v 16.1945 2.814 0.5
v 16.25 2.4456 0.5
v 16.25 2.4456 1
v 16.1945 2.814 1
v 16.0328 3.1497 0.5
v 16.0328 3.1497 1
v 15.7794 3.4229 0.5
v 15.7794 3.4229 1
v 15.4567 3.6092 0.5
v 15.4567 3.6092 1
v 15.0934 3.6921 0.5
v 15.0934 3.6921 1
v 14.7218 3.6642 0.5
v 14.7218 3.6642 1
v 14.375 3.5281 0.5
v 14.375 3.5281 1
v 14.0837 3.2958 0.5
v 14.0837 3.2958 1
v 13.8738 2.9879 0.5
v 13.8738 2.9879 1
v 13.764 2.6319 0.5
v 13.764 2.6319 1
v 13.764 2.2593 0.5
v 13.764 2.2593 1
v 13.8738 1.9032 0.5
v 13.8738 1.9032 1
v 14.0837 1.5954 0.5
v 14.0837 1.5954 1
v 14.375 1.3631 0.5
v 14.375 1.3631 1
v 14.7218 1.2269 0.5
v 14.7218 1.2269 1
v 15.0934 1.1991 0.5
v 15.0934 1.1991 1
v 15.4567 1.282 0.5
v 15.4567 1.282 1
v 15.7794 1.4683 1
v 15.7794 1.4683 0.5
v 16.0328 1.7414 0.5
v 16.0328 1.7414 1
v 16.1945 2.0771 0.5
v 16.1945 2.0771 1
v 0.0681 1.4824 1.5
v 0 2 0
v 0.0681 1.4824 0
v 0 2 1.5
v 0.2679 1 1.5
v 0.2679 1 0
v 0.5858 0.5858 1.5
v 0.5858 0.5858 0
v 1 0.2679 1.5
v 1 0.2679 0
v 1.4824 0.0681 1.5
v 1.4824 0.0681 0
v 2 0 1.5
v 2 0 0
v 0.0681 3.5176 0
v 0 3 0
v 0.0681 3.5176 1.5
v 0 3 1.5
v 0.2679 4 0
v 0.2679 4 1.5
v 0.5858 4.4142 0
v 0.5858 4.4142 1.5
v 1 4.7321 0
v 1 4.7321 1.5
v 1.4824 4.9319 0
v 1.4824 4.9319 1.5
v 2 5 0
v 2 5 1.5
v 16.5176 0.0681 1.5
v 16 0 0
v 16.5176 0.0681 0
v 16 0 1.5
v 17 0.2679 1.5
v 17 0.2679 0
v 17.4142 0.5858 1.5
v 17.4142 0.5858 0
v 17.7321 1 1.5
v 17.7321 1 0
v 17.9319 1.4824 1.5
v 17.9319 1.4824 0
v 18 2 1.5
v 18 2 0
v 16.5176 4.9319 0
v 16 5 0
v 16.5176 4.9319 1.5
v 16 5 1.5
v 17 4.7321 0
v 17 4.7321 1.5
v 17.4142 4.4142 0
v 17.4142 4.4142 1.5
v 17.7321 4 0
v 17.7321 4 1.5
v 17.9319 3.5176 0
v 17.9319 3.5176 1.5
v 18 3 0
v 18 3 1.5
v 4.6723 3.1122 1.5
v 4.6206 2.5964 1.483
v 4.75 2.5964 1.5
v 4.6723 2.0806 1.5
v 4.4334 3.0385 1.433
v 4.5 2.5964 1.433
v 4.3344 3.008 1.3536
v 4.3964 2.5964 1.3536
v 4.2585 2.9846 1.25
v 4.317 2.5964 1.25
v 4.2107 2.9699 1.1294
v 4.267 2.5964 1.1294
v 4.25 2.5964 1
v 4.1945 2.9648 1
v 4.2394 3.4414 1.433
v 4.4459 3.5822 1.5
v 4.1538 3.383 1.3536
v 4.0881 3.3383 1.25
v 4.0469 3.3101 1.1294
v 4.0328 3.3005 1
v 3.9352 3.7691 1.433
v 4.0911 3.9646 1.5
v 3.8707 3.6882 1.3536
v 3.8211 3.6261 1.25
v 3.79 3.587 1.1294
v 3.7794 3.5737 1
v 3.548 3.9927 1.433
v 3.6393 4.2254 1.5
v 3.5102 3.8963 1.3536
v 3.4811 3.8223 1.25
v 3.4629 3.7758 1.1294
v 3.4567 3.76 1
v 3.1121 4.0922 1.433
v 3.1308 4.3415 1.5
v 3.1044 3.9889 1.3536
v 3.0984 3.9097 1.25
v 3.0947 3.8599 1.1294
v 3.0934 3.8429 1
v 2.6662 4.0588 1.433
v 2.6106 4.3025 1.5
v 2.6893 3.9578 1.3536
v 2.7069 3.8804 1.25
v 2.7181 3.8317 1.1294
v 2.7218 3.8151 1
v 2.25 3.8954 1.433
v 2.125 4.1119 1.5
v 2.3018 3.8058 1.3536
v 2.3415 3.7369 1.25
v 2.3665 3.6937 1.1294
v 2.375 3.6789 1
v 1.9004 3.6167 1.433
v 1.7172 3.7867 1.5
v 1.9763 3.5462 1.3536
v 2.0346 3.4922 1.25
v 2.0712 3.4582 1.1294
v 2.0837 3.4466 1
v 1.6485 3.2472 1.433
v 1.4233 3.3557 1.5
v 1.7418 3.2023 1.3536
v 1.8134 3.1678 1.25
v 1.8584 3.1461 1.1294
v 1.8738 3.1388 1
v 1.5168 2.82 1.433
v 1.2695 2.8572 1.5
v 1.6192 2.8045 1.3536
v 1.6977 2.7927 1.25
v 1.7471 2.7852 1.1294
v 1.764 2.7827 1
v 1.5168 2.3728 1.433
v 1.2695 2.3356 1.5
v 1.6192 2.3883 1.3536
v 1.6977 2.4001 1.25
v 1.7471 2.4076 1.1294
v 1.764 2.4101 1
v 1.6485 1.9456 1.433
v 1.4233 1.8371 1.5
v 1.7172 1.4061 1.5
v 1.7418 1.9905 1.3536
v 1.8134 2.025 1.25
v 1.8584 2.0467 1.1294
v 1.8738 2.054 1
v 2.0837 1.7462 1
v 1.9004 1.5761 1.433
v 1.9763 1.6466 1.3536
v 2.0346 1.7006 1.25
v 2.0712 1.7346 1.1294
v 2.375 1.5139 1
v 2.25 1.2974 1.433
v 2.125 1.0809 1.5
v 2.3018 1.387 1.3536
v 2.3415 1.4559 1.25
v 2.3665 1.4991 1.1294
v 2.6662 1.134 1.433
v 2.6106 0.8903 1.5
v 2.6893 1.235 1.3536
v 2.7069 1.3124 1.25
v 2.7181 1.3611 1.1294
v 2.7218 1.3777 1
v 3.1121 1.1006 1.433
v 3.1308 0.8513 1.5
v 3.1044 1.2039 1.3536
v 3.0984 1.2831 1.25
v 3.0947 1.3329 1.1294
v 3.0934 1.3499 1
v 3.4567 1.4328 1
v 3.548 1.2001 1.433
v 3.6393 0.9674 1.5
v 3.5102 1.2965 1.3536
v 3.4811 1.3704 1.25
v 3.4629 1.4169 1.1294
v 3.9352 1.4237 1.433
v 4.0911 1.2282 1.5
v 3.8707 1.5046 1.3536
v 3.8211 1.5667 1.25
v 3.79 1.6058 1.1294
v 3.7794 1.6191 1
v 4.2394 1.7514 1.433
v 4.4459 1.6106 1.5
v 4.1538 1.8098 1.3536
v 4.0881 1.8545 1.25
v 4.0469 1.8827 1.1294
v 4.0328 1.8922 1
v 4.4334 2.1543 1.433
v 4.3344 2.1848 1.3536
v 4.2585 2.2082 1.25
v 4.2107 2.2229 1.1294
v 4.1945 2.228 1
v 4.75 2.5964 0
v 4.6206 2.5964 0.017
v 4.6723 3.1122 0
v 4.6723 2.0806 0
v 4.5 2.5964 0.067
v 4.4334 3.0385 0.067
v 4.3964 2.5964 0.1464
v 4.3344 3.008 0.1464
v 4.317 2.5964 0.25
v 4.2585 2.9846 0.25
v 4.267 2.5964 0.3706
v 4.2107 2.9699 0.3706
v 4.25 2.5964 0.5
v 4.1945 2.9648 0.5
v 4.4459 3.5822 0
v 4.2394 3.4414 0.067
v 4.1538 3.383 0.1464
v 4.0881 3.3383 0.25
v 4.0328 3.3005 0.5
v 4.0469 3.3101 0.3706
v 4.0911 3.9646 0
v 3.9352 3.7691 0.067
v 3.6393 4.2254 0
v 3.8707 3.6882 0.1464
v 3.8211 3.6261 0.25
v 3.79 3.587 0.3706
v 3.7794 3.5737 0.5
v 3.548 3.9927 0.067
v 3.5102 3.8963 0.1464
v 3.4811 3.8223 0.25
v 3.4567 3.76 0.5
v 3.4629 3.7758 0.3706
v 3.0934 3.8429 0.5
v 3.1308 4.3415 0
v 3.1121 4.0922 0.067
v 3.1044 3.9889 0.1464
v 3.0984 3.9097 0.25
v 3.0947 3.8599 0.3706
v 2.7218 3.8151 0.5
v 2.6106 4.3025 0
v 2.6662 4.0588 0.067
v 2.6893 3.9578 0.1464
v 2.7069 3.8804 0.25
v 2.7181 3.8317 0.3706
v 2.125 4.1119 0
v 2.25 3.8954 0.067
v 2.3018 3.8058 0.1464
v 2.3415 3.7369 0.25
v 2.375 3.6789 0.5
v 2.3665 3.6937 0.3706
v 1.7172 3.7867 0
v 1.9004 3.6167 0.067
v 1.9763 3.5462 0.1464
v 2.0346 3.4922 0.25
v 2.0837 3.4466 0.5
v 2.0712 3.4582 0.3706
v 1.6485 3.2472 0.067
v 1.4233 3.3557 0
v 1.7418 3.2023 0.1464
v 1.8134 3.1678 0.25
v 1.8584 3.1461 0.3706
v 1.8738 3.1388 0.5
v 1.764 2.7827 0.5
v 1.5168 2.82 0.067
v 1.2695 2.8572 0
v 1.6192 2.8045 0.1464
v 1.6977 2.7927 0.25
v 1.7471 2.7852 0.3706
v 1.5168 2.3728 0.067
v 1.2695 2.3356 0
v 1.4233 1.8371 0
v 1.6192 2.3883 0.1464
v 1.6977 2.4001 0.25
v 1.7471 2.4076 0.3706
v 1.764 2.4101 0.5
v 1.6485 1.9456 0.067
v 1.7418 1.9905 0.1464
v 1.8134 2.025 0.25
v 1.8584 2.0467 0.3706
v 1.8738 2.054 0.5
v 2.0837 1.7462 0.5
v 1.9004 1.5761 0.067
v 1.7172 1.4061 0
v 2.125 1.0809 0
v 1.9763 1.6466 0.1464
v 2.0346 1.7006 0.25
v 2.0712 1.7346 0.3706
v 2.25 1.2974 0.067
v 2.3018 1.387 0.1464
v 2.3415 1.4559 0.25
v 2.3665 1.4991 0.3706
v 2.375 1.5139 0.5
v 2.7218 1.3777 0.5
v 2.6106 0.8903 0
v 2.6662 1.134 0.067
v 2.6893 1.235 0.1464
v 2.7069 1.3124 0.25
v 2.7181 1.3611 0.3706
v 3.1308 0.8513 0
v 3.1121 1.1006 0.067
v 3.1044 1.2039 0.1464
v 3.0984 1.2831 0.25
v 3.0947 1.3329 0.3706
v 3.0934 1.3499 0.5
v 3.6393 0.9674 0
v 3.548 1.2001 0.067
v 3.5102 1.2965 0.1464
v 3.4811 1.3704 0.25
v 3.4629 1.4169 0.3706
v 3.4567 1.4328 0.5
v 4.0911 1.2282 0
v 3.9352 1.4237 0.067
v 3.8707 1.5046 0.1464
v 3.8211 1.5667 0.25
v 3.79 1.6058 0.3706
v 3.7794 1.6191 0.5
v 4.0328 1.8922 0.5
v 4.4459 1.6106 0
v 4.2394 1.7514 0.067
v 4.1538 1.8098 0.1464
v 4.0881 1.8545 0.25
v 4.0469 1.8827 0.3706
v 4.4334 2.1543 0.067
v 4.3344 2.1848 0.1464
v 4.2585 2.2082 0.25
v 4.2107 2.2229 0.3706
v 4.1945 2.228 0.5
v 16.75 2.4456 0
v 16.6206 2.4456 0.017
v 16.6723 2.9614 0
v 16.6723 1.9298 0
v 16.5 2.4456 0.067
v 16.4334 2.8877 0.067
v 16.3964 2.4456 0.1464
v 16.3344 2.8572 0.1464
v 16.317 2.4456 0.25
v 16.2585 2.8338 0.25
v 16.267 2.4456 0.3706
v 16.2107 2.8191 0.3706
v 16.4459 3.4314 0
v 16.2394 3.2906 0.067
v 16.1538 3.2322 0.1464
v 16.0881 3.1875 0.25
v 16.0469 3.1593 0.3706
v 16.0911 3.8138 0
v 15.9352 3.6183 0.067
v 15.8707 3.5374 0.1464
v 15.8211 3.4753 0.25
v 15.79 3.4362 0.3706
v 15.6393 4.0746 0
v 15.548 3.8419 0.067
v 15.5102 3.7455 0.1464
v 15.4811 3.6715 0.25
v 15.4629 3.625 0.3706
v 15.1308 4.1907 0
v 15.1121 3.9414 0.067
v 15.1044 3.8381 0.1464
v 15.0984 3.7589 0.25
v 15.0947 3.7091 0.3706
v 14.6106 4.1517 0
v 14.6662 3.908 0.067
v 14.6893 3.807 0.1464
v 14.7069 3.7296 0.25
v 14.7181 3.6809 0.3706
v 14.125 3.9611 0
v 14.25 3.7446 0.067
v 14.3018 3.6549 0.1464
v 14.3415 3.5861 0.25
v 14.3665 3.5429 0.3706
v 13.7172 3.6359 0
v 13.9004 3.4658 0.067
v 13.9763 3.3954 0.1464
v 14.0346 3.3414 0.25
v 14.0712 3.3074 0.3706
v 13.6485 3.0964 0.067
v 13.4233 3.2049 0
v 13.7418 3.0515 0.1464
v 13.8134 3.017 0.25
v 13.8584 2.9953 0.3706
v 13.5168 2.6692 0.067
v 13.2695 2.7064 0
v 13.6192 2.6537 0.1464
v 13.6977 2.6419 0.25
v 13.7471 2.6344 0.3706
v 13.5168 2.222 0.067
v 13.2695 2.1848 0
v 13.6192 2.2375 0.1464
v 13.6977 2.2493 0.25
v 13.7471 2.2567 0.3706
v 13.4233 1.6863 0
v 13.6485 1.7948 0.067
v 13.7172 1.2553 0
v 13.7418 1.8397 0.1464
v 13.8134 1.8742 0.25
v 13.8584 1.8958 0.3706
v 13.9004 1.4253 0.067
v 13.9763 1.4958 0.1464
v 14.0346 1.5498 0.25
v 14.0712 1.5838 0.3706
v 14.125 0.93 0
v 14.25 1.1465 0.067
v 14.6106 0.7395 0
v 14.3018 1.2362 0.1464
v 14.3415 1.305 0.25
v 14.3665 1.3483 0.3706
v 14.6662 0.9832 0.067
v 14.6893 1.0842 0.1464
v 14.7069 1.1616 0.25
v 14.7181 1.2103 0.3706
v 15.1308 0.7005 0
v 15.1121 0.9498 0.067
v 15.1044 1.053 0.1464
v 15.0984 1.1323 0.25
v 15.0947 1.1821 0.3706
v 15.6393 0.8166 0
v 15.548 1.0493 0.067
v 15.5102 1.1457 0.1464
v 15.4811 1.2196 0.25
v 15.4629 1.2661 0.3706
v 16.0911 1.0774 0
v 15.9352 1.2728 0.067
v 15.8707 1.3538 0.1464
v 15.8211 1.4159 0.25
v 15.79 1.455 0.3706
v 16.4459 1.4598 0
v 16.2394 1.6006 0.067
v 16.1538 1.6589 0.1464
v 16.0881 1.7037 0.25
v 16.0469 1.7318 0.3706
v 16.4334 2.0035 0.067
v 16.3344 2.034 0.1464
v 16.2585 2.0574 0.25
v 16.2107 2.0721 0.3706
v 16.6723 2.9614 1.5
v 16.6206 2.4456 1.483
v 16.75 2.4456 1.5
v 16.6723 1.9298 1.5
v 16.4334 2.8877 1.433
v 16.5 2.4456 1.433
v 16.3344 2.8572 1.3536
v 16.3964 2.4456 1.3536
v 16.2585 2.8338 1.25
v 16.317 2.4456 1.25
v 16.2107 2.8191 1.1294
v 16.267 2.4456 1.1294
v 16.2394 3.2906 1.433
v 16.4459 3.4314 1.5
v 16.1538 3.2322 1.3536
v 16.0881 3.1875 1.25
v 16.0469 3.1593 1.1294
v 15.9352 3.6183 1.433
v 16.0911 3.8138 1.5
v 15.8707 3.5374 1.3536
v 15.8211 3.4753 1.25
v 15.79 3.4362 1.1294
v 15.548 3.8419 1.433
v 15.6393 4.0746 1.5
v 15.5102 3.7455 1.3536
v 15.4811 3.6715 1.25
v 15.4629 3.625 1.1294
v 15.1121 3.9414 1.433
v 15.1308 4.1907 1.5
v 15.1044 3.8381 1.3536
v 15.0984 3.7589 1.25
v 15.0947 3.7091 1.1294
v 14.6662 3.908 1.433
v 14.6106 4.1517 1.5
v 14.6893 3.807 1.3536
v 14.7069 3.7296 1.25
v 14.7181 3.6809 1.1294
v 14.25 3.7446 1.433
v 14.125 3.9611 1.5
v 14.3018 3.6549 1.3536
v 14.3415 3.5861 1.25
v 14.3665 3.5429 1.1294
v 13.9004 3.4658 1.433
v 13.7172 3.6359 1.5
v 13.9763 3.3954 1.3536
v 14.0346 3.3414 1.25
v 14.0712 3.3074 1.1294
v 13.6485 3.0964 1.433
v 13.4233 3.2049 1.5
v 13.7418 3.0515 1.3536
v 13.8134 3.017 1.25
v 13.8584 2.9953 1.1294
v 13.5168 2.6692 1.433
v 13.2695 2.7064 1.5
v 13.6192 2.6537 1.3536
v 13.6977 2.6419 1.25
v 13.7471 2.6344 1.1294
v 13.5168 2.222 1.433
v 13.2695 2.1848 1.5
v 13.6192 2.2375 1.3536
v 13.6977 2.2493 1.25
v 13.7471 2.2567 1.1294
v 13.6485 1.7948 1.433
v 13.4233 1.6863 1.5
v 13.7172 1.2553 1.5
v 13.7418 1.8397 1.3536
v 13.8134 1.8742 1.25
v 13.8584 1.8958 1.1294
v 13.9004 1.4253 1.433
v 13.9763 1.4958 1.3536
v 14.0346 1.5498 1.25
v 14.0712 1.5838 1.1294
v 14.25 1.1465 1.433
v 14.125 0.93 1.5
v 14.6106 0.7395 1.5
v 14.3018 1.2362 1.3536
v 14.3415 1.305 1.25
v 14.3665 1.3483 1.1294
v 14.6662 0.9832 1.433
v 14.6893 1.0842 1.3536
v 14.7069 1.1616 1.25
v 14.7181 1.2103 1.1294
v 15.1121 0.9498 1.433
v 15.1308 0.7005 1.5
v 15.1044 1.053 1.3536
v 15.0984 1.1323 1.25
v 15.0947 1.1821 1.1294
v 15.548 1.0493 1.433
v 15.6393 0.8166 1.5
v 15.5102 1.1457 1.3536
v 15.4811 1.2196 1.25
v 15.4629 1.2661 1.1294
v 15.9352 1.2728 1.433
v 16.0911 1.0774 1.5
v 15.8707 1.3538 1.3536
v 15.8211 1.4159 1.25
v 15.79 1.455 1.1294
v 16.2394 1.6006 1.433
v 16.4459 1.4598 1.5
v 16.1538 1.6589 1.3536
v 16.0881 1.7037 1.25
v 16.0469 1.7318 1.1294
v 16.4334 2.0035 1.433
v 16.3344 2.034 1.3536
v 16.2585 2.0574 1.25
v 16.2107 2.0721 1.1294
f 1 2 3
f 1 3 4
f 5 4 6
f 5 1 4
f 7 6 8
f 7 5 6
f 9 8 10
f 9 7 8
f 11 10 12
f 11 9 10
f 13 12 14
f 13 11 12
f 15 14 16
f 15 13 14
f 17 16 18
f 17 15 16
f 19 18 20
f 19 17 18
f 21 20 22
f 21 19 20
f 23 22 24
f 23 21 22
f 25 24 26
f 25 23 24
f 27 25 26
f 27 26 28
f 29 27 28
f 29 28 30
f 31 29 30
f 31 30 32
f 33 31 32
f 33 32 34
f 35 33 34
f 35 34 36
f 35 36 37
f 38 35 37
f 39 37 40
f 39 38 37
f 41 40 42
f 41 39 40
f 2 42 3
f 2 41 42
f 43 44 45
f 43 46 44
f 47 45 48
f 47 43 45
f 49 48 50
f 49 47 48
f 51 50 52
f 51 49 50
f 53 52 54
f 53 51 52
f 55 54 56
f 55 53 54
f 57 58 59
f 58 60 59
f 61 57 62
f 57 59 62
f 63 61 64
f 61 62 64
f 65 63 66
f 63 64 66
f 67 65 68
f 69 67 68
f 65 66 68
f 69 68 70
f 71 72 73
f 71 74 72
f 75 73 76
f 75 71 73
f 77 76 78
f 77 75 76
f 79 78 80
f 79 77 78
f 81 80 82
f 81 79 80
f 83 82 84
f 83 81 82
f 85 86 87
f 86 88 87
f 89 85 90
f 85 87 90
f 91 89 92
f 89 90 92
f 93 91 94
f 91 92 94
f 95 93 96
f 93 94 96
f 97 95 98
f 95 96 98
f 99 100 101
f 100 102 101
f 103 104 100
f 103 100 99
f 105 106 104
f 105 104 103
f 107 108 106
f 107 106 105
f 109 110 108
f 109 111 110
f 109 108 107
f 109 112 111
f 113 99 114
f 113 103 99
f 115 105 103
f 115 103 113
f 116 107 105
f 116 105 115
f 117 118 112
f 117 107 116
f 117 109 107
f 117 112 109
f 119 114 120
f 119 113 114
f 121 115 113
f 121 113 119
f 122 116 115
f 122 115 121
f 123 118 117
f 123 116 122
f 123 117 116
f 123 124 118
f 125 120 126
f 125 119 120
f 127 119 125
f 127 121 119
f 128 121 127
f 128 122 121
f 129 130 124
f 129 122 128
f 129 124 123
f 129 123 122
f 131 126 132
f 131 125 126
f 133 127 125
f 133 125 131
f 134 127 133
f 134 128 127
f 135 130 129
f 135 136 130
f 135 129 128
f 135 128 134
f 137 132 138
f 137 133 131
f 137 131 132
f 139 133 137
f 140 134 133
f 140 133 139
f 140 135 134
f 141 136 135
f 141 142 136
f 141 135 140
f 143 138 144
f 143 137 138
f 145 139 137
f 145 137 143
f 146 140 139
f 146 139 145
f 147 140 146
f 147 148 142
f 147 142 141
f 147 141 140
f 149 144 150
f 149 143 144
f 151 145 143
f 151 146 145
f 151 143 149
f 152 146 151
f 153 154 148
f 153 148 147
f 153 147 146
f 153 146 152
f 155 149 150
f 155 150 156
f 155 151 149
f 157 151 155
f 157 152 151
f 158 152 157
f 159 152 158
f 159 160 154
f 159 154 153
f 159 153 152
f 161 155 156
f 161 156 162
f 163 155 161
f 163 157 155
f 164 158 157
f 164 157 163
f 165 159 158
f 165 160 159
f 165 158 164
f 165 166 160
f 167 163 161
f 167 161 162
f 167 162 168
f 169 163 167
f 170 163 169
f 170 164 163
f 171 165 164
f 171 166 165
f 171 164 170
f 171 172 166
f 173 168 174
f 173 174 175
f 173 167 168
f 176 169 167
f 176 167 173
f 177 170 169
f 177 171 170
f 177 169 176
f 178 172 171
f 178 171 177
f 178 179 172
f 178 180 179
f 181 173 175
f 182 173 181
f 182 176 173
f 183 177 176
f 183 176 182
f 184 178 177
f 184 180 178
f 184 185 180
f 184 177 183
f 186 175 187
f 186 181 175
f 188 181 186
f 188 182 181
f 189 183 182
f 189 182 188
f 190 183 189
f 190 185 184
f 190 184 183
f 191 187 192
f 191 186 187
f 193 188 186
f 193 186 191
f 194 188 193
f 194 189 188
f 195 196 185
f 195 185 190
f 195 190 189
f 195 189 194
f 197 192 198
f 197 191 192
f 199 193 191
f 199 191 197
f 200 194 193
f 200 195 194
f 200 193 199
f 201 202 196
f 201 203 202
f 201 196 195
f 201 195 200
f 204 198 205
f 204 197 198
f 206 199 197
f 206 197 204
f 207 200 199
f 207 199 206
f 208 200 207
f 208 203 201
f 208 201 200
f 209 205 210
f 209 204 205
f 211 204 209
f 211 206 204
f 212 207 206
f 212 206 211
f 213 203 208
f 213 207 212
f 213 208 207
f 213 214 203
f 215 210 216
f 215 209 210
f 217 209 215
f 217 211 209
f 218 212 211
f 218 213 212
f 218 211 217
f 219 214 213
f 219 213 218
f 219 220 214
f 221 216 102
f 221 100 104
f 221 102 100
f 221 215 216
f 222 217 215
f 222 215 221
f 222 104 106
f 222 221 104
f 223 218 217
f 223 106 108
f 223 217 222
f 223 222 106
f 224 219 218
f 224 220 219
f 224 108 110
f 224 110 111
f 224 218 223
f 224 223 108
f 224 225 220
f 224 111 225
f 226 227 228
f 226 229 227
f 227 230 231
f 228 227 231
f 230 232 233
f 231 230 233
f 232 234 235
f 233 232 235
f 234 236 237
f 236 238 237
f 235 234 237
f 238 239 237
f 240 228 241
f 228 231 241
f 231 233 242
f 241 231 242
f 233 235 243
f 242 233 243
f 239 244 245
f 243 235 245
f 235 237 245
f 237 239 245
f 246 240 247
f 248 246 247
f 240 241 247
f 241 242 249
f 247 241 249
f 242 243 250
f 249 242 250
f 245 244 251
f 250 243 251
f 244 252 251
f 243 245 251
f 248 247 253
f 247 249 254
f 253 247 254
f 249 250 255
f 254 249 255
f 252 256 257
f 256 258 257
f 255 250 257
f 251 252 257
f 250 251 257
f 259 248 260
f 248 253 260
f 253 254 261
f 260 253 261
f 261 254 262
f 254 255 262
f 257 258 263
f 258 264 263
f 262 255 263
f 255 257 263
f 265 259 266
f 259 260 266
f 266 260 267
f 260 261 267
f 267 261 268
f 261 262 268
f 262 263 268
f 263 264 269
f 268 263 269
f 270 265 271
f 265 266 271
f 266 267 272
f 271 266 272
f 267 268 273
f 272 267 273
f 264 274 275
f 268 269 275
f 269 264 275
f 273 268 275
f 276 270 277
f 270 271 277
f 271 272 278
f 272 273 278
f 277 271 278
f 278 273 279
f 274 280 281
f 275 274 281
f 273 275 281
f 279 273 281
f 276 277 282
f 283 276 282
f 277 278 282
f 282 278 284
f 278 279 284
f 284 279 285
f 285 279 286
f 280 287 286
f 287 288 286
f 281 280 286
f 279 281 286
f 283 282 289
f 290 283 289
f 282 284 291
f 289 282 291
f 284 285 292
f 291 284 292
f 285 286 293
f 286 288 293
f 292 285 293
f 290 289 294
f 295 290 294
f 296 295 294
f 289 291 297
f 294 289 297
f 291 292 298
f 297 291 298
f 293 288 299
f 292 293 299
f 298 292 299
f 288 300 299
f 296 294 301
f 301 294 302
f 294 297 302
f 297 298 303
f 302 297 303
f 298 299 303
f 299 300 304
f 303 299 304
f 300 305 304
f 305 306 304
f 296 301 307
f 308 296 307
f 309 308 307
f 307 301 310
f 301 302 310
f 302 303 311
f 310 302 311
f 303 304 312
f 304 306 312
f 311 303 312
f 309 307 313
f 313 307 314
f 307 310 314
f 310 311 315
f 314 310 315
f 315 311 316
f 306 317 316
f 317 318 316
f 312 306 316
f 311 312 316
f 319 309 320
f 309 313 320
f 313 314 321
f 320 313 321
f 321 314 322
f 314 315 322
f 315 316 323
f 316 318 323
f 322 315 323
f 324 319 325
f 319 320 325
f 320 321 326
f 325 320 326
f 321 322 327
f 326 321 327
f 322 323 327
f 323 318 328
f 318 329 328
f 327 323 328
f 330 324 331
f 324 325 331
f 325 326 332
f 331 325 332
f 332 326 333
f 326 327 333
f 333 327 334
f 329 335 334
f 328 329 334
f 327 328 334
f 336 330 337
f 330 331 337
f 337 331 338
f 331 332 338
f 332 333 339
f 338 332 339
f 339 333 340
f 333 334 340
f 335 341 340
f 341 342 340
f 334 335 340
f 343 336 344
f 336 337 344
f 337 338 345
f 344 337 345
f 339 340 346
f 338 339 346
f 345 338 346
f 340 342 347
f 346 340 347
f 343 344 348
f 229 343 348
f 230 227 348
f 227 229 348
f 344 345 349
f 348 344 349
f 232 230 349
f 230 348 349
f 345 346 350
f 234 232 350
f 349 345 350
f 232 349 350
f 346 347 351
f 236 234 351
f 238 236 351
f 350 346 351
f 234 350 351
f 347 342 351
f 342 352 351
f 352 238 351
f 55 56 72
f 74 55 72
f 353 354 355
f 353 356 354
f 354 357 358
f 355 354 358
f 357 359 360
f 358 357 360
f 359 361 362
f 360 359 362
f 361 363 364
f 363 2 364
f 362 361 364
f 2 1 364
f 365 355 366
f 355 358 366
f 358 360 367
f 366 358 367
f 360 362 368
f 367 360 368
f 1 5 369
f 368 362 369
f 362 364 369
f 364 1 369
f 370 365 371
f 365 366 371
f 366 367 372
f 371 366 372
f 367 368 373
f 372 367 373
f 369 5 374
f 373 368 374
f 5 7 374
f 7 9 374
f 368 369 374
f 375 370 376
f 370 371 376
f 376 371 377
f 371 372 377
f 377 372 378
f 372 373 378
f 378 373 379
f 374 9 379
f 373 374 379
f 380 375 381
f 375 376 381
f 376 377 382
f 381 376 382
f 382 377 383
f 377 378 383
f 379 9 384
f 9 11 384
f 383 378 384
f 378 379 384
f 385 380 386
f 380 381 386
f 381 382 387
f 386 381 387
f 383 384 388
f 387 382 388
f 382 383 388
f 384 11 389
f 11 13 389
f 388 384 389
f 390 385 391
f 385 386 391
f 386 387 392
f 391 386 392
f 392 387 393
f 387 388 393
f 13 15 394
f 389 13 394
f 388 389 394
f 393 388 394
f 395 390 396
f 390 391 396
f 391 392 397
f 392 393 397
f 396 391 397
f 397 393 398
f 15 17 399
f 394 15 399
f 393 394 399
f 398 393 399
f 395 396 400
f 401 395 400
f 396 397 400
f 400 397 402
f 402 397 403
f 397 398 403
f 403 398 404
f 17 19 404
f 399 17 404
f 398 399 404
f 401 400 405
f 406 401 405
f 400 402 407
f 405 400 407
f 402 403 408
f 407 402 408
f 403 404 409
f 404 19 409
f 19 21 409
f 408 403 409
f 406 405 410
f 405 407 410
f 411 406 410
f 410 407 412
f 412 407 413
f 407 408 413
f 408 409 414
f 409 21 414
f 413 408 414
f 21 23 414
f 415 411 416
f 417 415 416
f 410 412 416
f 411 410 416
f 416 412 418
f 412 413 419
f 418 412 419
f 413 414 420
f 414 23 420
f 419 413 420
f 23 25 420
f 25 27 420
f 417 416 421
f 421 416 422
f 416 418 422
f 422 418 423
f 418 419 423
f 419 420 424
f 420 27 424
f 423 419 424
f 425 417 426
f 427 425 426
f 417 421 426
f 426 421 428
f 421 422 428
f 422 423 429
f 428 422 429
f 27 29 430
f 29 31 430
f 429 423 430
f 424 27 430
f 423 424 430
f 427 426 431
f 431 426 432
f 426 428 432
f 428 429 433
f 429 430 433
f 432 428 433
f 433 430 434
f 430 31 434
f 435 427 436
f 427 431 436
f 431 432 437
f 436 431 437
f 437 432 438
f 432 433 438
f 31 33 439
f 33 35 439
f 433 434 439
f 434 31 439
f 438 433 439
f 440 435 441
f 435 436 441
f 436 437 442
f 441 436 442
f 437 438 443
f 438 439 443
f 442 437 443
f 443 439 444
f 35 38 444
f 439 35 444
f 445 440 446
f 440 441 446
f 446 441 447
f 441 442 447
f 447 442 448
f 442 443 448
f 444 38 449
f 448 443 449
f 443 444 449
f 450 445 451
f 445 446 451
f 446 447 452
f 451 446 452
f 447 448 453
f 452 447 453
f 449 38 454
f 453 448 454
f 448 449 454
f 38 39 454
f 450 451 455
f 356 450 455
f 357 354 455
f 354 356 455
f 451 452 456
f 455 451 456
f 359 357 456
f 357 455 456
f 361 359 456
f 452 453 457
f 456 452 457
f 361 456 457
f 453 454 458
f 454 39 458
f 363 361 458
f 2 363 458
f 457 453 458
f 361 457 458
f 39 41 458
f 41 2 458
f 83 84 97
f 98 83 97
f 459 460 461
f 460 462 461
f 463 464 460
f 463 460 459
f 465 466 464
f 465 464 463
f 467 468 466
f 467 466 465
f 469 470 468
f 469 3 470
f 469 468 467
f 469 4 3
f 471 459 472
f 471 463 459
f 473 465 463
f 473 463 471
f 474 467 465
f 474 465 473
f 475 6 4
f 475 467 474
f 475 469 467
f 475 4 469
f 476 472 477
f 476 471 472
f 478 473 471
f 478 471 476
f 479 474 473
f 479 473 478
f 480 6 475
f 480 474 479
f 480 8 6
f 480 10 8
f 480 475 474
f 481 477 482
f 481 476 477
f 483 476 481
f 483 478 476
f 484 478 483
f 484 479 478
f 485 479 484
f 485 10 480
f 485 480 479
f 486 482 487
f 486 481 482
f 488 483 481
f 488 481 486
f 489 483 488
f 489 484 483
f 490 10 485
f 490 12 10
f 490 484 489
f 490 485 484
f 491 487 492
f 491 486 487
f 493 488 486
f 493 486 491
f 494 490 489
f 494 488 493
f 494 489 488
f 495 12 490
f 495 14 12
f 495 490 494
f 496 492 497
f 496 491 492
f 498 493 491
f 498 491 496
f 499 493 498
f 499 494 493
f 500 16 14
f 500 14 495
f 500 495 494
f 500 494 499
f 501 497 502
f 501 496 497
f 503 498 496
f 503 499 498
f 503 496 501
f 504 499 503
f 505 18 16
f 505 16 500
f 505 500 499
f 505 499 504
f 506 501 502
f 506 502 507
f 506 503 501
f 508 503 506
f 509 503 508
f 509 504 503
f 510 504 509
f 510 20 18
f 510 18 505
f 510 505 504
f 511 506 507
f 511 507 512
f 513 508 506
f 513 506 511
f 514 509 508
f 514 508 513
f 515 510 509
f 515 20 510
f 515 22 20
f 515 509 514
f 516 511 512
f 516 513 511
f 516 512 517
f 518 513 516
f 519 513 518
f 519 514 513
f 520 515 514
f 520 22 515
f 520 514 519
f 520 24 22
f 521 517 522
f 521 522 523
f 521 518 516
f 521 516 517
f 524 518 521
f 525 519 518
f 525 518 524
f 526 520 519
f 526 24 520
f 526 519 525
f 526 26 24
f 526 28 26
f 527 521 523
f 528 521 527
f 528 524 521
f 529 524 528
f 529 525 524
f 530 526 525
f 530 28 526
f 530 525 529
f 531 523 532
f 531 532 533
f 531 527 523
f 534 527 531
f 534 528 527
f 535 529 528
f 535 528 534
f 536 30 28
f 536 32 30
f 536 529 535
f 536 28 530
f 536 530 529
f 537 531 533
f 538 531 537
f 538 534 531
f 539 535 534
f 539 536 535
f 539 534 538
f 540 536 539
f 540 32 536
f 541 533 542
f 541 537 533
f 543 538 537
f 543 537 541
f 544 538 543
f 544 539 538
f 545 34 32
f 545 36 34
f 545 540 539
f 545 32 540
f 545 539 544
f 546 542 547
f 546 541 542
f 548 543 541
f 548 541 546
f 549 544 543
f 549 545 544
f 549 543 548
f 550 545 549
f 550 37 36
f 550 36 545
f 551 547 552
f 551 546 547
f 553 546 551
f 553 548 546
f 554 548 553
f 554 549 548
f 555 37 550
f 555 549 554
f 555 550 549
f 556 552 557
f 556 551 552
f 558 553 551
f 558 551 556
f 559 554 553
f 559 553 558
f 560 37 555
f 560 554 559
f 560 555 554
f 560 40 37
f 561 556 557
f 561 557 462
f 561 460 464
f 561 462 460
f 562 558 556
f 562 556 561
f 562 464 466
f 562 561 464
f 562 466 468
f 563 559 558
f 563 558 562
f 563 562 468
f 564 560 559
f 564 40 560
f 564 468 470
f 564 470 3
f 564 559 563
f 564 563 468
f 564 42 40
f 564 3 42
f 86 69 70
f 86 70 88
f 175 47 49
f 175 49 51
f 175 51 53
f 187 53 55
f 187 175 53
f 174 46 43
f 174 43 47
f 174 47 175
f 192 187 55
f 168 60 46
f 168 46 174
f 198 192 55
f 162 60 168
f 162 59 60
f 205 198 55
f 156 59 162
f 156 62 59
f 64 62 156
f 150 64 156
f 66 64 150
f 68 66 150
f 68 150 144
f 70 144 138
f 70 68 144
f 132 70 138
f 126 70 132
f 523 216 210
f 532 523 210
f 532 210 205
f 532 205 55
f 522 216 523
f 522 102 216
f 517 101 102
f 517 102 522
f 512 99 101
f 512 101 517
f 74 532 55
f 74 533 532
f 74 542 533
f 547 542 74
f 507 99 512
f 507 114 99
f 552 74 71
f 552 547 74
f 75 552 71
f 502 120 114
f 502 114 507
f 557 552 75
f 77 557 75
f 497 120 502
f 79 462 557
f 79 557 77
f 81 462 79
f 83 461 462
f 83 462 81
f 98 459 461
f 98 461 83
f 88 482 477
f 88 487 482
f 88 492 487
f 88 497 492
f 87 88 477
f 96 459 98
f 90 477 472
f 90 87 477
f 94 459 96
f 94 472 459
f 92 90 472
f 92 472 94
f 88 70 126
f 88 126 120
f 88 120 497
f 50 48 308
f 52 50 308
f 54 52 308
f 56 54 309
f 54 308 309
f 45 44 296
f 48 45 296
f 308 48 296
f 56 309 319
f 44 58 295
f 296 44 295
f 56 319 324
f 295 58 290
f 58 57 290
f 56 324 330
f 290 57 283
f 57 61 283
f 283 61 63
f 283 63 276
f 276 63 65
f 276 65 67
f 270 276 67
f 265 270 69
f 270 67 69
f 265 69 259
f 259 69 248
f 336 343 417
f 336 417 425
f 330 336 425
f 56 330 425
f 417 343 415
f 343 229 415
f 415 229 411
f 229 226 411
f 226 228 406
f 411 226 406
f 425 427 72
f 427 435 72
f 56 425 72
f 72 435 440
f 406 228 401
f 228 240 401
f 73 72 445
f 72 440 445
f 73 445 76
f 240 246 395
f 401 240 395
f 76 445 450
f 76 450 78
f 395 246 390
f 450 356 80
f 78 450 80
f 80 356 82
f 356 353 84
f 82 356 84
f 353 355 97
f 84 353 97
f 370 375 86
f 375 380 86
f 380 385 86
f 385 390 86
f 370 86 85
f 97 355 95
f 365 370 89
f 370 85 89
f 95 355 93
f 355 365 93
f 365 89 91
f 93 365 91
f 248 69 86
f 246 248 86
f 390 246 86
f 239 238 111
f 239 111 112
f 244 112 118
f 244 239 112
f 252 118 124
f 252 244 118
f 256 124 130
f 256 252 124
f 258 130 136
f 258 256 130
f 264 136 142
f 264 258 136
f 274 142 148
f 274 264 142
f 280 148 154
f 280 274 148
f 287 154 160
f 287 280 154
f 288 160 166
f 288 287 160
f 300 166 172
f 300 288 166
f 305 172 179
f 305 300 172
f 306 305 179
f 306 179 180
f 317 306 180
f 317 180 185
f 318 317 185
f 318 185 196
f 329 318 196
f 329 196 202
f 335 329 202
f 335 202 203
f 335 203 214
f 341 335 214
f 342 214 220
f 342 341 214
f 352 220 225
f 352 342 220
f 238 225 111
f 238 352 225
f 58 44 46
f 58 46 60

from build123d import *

# Parameters (mm, degrees)
F1_W     = 18
F1_H     = 5
F1_R     = 1.25
F2_DEPTH = 1.5
F3_R     = 2
F4_R     = 0.5


with BuildPart() as f2:
    # F1 (on face) → F2 (new body)
    with BuildSketch(Plane.XY):
        with Locations((9, 2.5)):
            Rectangle(F1_W, F1_H)
        with Locations((15, 2.445588)):
            Circle(F1_R, mode=Mode.SUBTRACT)
        with Locations((3, 2.596398)):
            Circle(F1_R, mode=Mode.SUBTRACT)
    extrude(amount=F2_DEPTH)

    # F3
    f3_edges = [f2.edges().sort_by_distance(p)[0] for p in [
        (0, 5, 0.75),
        (0, 0, 0.75),
        (18, 0, 0.75),
        (18, 5, 0.75),
    ]]
    fillet(f3_edges, radius=F3_R)

    # F4
    f4_edges = [f2.edges().sort_by_distance(p)[0] for p in [
        (1.75, 2.596398, 1.5),
        (16.25, 2.445588, 0.75),
        (13.75, 2.445588, 0),
        (13.75, 2.445588, 1.5),
        (1.75, 2.596398, 0),
    ]]
    fillet(f4_edges, radius=F4_R)


solid = f2.part
